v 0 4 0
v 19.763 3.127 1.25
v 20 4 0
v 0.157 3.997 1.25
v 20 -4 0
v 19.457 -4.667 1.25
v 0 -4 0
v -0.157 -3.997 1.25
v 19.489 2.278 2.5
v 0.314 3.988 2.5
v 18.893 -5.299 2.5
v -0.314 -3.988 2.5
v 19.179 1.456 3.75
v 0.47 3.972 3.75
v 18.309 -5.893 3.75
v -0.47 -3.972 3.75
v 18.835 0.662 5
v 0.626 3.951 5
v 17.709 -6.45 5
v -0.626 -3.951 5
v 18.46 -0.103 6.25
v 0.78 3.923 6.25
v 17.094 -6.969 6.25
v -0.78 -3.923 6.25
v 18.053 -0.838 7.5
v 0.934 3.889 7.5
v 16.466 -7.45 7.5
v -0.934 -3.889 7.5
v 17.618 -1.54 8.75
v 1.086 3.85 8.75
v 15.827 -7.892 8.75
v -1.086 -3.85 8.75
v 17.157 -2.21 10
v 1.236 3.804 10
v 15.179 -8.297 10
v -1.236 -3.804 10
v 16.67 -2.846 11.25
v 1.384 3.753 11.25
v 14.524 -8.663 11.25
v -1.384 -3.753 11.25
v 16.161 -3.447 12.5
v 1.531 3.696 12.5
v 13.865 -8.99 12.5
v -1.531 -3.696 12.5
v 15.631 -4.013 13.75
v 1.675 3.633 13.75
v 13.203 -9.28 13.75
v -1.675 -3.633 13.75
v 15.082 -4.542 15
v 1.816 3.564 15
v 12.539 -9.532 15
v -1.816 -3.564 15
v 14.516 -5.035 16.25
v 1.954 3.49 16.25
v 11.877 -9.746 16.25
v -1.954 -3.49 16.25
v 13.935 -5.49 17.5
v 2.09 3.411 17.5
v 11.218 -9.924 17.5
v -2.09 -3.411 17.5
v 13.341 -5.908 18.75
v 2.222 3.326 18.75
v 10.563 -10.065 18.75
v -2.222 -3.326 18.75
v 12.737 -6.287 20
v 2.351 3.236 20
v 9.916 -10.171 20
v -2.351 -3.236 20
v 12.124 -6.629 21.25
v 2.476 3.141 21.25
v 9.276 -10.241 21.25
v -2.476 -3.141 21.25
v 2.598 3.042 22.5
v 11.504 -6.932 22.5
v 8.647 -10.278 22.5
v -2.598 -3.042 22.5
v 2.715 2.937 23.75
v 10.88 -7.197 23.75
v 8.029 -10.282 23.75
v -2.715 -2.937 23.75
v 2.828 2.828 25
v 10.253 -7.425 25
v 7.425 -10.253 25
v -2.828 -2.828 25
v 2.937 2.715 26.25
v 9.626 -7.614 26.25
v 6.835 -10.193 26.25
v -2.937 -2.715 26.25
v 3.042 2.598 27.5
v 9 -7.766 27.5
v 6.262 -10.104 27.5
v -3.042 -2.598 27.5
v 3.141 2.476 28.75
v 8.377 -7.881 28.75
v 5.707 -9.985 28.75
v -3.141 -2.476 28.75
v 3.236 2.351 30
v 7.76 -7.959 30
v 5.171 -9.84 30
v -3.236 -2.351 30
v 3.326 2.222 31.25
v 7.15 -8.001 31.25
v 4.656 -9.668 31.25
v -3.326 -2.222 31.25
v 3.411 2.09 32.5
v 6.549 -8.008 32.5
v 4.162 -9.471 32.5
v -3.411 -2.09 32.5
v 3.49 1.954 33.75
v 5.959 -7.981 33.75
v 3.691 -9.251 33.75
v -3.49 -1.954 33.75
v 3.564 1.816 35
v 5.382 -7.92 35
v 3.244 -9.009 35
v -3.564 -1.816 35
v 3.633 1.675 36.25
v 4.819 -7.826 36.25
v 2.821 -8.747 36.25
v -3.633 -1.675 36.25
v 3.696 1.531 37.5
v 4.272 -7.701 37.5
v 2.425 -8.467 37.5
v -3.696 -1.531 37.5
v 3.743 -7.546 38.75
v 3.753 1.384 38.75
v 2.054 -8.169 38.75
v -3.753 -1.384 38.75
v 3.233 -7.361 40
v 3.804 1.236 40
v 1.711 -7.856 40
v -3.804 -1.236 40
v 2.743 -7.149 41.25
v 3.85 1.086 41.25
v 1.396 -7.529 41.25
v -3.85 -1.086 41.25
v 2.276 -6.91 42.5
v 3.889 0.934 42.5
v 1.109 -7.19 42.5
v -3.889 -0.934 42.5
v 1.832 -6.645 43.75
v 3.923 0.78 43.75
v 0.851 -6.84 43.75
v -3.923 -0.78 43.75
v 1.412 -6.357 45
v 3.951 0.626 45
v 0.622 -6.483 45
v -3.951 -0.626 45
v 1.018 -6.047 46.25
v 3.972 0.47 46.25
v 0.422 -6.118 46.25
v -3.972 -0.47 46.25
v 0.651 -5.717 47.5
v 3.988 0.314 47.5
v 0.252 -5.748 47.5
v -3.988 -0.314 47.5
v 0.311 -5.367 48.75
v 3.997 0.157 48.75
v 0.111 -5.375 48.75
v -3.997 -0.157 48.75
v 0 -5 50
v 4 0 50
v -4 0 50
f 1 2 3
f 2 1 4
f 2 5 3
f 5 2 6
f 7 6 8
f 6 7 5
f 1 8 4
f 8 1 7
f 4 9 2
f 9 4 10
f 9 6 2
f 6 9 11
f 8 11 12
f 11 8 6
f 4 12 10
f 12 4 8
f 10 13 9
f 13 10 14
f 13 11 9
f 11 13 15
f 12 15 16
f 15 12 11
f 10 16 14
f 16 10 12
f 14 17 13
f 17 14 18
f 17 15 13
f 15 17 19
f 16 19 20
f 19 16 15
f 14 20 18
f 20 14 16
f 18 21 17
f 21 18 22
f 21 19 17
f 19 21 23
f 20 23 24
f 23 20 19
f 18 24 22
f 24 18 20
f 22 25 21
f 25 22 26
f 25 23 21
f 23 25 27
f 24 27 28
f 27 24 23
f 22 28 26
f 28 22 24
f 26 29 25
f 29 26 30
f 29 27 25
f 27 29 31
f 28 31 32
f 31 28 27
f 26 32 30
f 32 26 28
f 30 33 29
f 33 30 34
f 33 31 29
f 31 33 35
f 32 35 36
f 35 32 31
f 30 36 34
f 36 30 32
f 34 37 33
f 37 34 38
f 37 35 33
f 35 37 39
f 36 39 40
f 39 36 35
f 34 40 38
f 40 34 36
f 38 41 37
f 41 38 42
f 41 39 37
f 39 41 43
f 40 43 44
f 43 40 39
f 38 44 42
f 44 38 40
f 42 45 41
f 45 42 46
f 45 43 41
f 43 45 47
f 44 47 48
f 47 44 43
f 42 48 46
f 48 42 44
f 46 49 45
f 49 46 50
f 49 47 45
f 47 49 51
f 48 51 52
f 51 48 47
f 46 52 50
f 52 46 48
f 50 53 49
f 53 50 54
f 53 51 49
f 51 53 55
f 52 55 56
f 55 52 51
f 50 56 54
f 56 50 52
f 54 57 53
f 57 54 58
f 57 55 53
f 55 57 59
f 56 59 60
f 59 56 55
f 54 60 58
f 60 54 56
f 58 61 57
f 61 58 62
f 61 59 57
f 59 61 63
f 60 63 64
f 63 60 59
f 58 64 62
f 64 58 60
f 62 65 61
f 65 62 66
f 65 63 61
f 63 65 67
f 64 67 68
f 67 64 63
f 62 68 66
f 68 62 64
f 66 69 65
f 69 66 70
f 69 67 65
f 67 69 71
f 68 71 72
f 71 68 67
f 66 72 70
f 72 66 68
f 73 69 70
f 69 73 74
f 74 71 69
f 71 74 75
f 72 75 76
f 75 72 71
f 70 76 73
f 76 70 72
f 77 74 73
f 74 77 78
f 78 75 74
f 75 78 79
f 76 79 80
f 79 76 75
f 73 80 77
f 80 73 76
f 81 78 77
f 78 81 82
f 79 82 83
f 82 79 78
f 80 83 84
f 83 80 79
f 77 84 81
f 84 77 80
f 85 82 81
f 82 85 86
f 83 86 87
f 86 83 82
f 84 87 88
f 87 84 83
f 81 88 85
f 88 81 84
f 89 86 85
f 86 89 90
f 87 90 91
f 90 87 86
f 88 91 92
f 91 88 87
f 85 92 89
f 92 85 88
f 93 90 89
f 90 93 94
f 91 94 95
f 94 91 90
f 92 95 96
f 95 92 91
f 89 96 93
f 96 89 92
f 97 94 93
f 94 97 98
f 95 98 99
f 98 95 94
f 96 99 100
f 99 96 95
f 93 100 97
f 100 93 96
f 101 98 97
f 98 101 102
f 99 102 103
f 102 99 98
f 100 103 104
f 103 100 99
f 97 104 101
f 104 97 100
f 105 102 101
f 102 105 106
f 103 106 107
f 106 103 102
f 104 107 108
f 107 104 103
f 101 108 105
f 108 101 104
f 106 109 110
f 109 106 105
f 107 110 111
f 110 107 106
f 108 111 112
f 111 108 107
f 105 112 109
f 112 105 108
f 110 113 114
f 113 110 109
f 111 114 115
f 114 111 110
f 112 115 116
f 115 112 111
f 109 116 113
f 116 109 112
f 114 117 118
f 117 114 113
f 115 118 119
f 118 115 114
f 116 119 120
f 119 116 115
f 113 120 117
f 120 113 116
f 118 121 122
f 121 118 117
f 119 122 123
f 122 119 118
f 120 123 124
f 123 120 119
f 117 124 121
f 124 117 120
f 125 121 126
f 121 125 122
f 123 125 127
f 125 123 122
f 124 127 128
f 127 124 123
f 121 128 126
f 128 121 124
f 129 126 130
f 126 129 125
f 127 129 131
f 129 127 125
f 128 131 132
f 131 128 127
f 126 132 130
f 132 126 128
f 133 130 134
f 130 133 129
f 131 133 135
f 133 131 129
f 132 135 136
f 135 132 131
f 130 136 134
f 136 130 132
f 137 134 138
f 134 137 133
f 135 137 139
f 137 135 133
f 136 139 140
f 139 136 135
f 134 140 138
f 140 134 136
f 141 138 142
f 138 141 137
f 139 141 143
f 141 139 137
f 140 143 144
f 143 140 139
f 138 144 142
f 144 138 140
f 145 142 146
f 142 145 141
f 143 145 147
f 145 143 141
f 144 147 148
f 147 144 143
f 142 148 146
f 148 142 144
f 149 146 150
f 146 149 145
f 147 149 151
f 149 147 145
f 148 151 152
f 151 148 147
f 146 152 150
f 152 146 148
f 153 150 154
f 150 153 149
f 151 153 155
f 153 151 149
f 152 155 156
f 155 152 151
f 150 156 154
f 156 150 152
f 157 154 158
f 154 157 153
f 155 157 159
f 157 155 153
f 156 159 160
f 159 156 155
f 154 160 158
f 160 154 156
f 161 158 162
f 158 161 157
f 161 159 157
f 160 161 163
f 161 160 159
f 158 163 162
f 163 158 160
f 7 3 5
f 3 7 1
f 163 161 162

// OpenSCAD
//  meshbuilder
//
//  This libray is designed to be used in conjuction with pathbuilder to create complex 3D shapes.
//  With pathbuilder (https://github.com/dinther/pathbuilder) it is easy to morph from one complex 2D shape
//  to another similar 2D shape. (See svgTweenPath command in pathbuilder for the limitations)
//
//  A mesh can be stiched by stacking multiple 2D shapes on top of each other.
//  kinda the reverse of how a slicer turns a 3D object in many outlines.
//  
//  The number of points on each stacked 2D shape need to match.
//
//  pointLayers is a list containing path lists with 3D points.
//  The module demo shows a simple rectangle that changes shape as it is moved up.
//  This shape can not be achieved with the twist parameter in linear_extrude.
//
//  Latest version here: https://github.com/dinther/pathbuilder
//
//  By: Paul van Dinther


//  TODO: aligning the start of the paths
//  TODO: learn about smarts to make better stiching decisions
//
module buildMeshFromPointLayers(pointLayers = [], sides = true, bottom=true, top=true){
    n = len(pointLayers[0]);
    pts = [for (deck=[0:1:len(pointLayers)-1]) each pointLayers[deck]];
	side_faces = [for (d = [0:1:len(pointLayers)-2], p = [0:1:len(pointLayers[d])-1])	let(c = (n * d)+ p, last=p+1==len(pointLayers[d]) ) [c,last? d*n: c+1, last? c+1 : c+n+1, c+n]];
    bottom_faces = bottom? [[for(i=[n-1:-1:0]) i]] : [];
    top_faces = top? [[for(i=[len(pts) - n:len(pts)-1]) i]] : [];
	polyhedron(points = pts, faces = concat(side_faces, bottom_faces, top_faces), convexity = 10);
}

function rotateAroundZ(x, y, z, angle) = let (
    c = cos(angle),
    s = sin(angle),
    nx = (c * x) + (s * y),
    ny = (c * y) - (s * x)) [nx, ny, z];


module demo(){
    steps = 40;
    l1 = 20;
    l2 = 5;
    ls = (l2-l1)/steps;
    w1 = 8;
    w2 = 0;
    ws = (w2-w1)/steps;
    h = 50;
    hs = h / steps;
    wh = w1 * 0.5;
    
    a = 90;
    as = a/steps;
    points = [[0,wh],[l1, wh],[l1,-wh],[0,-wh]];
    pl = [for (i=[0:steps])
        [rotateAroundZ(points[0][0], points[0][1], i*hs, i*as),
        rotateAroundZ(points[1][0]+i*ls, points[1][1]+ i*ws*0.5, i*hs, i*as),
        rotateAroundZ(points[2][0]+i*ls, points[2][1]- i*ws*0.5, i*hs, i*as),
        rotateAroundZ(points[3][0], points[3][1], i*hs, i*as)]
    ];
    
    buildMeshFromPointLayers(pl, true, true,true);
}

demo();
